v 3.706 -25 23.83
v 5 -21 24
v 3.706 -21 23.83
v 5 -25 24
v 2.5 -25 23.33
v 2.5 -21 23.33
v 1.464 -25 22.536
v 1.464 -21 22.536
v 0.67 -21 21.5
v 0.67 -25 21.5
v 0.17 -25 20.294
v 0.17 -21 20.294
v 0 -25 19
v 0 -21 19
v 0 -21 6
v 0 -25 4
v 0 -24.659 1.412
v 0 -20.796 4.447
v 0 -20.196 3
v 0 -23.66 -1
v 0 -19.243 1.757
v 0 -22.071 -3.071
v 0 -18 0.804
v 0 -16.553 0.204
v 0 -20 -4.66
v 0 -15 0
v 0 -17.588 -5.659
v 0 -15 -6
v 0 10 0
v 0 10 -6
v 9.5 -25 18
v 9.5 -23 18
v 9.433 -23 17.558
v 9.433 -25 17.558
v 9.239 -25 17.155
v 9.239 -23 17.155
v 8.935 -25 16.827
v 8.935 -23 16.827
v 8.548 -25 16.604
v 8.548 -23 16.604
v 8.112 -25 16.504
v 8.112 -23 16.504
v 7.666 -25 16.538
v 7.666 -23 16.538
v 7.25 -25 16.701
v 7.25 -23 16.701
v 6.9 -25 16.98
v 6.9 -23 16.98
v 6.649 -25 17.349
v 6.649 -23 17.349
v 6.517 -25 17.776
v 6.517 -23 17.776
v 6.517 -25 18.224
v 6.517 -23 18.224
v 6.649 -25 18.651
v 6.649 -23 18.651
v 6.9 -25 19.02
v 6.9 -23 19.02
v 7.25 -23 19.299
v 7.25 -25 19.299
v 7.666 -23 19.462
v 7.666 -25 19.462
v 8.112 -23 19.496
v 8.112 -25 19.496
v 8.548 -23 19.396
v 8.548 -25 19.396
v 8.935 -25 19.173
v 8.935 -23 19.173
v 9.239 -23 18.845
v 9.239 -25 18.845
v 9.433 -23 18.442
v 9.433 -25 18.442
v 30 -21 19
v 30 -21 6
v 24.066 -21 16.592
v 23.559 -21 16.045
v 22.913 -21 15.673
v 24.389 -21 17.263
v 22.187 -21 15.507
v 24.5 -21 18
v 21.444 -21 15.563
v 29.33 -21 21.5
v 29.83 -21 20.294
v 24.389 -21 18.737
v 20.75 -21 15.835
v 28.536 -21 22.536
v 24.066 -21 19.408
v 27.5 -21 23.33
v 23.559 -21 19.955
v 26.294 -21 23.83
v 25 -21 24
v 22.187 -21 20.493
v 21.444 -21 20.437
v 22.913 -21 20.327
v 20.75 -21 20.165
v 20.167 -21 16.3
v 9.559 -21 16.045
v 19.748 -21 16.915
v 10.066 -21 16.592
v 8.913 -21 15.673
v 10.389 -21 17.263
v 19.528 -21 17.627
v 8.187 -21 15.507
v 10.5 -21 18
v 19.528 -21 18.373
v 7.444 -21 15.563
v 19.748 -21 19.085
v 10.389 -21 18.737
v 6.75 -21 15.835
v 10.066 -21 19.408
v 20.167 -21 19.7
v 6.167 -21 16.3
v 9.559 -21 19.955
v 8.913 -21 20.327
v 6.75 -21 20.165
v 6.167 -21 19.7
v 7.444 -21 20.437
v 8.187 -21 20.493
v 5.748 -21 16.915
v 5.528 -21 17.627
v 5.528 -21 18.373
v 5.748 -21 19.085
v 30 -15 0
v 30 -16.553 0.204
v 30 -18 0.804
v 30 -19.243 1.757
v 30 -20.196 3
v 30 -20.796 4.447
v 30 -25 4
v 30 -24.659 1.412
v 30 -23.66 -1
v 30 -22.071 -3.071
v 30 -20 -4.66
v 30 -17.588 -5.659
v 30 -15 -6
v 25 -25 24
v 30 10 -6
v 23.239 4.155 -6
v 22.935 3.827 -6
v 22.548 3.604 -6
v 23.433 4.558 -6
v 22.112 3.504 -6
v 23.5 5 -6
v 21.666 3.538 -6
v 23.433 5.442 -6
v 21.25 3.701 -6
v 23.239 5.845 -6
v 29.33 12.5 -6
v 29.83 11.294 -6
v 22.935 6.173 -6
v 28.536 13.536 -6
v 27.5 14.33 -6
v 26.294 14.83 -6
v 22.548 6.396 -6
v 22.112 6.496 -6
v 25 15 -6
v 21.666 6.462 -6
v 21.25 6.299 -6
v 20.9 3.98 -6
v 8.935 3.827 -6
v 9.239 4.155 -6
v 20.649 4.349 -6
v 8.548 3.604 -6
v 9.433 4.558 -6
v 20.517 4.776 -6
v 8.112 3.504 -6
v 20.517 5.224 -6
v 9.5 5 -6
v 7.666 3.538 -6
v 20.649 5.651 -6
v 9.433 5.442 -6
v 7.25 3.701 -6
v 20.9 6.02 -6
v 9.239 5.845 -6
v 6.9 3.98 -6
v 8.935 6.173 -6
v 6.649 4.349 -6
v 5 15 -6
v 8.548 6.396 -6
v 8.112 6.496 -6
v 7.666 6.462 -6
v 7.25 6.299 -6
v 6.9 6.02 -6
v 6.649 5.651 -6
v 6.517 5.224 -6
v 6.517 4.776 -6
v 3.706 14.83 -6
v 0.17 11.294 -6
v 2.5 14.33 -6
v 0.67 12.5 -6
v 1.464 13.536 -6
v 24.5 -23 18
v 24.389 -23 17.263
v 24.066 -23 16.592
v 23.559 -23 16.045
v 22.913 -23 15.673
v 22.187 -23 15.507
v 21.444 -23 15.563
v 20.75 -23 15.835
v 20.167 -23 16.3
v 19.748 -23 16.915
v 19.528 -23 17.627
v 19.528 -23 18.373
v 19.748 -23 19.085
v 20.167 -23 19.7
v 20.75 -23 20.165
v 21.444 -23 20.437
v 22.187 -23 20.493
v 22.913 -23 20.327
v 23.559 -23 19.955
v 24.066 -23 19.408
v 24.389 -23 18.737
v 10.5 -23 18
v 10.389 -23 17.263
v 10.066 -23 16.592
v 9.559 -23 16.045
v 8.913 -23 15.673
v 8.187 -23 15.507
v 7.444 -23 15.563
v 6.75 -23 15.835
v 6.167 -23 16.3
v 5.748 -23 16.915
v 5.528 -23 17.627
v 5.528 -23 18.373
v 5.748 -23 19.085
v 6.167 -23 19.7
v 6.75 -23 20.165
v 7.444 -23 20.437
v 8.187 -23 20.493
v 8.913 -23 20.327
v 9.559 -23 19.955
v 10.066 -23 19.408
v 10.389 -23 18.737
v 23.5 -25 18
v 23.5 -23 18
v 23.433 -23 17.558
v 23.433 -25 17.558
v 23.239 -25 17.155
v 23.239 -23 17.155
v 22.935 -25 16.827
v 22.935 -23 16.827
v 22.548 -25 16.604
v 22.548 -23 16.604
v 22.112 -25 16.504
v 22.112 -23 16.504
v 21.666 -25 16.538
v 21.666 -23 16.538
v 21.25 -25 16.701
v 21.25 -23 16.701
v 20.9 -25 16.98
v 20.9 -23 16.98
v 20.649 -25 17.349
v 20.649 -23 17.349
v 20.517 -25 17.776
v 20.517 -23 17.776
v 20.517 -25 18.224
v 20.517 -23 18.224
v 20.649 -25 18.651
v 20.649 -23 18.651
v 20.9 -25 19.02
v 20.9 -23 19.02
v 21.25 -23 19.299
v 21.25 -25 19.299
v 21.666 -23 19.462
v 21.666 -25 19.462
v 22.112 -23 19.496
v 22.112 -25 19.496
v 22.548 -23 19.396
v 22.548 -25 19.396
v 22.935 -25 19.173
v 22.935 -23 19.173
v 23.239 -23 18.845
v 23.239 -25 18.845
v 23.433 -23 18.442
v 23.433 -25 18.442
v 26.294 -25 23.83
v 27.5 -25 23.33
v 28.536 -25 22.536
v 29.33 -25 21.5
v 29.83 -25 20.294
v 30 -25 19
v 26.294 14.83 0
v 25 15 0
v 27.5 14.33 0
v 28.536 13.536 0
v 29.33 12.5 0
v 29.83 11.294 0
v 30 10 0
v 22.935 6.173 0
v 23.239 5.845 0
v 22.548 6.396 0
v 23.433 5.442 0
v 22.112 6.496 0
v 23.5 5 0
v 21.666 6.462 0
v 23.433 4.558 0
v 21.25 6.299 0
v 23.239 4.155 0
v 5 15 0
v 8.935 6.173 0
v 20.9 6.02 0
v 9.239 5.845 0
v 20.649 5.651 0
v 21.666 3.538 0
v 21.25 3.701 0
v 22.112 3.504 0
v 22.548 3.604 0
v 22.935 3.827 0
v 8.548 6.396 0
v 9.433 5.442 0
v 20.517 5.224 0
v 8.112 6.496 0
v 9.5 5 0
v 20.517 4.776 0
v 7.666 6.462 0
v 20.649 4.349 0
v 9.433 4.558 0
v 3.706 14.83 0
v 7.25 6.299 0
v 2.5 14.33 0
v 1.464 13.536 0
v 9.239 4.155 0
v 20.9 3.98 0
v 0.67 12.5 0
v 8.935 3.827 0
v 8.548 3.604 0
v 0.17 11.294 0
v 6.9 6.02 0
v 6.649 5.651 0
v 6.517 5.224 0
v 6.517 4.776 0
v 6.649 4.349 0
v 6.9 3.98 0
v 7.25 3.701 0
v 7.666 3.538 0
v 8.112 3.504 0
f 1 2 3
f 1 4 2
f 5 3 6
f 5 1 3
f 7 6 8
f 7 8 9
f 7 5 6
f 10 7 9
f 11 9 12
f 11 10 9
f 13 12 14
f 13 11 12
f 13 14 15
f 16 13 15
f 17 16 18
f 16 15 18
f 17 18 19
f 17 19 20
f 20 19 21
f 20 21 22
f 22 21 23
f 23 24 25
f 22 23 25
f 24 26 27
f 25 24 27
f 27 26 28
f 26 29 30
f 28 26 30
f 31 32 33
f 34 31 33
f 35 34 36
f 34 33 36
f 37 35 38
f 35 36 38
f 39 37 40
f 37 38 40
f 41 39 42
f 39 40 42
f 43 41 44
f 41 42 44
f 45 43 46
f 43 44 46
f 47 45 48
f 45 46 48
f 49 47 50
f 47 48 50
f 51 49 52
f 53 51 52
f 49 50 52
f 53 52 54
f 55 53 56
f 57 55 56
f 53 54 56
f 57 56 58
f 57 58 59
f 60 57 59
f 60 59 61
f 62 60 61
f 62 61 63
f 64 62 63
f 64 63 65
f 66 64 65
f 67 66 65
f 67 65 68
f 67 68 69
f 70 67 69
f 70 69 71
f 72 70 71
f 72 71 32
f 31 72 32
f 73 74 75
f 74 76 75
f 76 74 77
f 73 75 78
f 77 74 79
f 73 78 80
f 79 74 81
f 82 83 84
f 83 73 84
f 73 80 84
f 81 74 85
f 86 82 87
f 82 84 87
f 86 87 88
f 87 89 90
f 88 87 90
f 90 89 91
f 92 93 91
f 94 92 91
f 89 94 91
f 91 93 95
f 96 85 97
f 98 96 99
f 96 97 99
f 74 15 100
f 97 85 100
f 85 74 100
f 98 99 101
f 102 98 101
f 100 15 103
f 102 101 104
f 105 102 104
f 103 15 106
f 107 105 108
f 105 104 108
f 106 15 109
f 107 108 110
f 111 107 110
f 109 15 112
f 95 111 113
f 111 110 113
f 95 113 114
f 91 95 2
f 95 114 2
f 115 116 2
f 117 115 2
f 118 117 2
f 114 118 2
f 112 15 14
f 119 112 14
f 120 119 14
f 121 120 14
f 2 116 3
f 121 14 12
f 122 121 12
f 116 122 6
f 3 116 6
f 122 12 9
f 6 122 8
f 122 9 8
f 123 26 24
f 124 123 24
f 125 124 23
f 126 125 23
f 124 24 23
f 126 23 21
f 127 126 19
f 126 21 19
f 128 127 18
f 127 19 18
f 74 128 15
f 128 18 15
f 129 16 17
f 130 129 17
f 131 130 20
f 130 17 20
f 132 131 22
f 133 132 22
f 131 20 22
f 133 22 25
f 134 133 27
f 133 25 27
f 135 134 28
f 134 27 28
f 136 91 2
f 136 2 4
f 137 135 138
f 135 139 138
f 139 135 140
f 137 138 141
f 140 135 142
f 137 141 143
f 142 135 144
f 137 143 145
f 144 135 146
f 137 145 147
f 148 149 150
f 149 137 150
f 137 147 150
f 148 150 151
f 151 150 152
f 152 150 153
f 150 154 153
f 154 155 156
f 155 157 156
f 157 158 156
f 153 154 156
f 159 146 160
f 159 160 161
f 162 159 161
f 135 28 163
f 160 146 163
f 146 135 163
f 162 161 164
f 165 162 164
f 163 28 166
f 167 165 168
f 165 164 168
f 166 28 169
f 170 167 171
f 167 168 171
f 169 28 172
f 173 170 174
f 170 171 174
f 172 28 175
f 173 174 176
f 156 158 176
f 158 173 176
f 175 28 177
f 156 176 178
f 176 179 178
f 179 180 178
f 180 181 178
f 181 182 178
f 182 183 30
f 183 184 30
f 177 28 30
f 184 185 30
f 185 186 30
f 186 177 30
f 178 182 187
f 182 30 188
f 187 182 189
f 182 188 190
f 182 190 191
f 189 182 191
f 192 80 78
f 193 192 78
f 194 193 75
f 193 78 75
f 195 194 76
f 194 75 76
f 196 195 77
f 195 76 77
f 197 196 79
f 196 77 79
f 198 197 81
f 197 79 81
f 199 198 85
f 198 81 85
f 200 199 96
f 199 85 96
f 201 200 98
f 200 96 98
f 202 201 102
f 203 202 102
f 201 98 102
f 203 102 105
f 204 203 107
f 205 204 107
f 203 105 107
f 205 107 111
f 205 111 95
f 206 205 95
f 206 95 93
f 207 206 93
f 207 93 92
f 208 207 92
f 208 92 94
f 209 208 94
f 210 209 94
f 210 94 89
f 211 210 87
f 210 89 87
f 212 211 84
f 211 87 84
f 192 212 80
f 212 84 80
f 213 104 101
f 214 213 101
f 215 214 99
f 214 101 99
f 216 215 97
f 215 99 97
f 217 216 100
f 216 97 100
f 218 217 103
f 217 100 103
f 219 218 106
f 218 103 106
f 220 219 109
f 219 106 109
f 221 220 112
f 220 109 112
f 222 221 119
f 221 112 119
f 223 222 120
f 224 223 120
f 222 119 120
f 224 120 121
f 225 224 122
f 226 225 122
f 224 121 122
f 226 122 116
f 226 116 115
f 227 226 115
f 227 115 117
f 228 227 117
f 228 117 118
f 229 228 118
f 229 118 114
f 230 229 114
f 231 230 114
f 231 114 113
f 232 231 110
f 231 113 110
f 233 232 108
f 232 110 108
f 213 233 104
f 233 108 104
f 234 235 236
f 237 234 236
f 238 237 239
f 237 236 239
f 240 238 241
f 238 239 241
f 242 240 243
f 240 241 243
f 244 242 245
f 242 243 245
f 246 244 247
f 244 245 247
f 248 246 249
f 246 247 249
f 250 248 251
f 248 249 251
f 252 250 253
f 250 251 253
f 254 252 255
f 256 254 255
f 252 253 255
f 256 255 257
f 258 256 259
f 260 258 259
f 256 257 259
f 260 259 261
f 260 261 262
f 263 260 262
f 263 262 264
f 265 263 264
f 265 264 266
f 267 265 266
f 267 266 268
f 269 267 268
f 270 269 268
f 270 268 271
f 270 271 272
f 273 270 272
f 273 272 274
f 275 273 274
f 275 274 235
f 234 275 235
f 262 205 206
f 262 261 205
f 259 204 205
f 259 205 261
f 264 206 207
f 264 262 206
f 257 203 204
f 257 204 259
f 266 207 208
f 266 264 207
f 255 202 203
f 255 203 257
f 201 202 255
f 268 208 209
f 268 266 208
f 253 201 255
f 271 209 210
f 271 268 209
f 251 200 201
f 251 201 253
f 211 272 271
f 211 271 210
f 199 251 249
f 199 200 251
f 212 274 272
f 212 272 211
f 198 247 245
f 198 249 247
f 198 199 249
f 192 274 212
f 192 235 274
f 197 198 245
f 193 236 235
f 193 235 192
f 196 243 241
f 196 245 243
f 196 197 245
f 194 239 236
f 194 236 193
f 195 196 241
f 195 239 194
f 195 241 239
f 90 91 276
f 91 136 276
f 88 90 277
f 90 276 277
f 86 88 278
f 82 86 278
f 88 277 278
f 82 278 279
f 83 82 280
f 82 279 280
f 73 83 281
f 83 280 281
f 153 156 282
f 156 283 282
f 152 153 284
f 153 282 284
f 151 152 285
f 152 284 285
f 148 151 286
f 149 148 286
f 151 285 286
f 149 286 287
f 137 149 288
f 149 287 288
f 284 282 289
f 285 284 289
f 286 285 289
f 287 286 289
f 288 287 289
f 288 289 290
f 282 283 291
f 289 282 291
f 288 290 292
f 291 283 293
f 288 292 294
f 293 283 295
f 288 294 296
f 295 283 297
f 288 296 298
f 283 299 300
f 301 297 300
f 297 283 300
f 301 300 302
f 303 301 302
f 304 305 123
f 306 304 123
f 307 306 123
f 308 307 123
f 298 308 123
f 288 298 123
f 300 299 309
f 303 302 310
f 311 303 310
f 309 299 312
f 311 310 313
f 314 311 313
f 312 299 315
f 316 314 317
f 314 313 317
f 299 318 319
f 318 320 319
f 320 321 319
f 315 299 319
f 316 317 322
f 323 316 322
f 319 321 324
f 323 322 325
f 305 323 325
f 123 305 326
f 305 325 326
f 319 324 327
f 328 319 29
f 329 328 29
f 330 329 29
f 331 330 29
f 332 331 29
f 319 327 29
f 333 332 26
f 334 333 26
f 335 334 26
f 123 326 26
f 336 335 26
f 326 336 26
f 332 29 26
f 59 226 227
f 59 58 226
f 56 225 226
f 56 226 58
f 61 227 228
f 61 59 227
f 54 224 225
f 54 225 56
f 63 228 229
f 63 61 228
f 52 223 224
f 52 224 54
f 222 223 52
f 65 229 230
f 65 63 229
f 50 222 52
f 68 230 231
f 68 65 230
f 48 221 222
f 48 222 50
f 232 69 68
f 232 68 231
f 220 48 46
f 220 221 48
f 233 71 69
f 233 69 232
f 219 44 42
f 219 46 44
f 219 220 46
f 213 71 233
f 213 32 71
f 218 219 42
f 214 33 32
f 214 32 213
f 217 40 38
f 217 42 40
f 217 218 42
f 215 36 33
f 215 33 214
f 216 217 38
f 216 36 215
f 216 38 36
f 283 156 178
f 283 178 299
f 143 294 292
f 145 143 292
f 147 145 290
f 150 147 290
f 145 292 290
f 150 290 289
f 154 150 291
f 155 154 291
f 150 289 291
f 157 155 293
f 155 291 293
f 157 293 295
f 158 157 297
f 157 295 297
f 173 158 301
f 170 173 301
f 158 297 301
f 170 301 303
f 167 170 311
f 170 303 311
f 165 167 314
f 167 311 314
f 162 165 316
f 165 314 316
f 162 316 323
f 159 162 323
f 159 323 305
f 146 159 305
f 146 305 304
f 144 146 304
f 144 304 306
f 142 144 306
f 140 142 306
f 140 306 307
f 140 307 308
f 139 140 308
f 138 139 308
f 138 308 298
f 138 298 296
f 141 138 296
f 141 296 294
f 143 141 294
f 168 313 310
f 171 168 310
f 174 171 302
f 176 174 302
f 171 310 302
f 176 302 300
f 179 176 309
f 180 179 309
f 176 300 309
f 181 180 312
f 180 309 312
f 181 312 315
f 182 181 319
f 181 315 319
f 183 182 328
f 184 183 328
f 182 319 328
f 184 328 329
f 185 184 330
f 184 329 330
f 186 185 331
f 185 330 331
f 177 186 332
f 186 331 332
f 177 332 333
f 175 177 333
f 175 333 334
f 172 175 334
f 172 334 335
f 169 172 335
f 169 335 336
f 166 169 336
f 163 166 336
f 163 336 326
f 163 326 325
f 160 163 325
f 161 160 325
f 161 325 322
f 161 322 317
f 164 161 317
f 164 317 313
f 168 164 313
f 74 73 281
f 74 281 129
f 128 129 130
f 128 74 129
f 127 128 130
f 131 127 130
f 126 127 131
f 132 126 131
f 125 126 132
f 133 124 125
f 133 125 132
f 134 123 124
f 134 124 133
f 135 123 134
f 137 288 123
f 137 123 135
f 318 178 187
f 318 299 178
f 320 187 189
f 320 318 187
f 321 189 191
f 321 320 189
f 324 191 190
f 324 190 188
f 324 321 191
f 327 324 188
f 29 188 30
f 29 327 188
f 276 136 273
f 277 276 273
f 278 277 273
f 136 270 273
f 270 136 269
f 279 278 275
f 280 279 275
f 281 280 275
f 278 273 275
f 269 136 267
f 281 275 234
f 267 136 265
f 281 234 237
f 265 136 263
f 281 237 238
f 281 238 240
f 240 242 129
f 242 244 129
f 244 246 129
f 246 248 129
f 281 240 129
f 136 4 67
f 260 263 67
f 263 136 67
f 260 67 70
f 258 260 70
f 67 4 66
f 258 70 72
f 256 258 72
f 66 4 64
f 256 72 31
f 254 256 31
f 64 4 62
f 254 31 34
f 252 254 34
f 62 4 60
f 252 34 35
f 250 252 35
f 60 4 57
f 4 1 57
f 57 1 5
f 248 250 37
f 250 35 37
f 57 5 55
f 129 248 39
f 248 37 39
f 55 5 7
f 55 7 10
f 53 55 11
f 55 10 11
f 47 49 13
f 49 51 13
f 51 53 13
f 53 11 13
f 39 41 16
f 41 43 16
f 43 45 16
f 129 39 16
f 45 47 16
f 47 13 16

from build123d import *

# Parameters (mm, degrees)
BOSS_EXTRUDE2_DEPTH = 30
FILLET1_R           = 5
CUT_EXTRUDE1_REACH  = 54.65
SKETCH6_R           = 1.5
SKETCH6_3_R         = 2.5
CUT_EXTRUDE2_DEPTH  = 2
CUT_EXTRUDE3_REACH  = 47.837
SKETCH8_R           = 1.5


with BuildPart() as part:
    # Sketch3 → Boss-Extrude2 (new body)
    with BuildSketch(Plane(origin=(0, 0, 0), x_dir=(0, 0, -1), z_dir=(1, 0, 0))):
        with BuildLine():
            Line((0, 15), (0, -15))
            ThreePointArc((0, -15), (-1.757359313, -19.242640687), (-6, -21))
            Line((-6, -21), (-24, -21))
            Line((-24, -21), (-24, -25))
            Line((-24, -25), (-4, -25))
            ThreePointArc((-4, -25), (3.071067812, -22.071067812), (6, -15))
            Line((6, -15), (6, 15))
            Line((6, 15), (0, 15))
        make_face()
    extrude(amount=BOSS_EXTRUDE2_DEPTH)

    # Fillet1
    fillet1_edges = [part.edges().sort_by_distance(p)[0] for p in [
        (30, 15, -3),
        (0, 15, -3),
        (30, -23, 24),
        (0, -23, 24),
    ]]
    fillet(fillet1_edges, radius=FILLET1_R)

    # Sketch6 → Cut-Extrude1 (cut, up to next)
    with BuildSketch(Plane(origin=(0, -21, 0), x_dir=(1, 0, 0), z_dir=(0, 1, 0)), mode=Mode.PRIVATE) as cut_extrude1_sk1:
        with Locations((8, -18)):
            Circle(SKETCH6_R)
    cut_extrude1_tool1 = extrude(cut_extrude1_sk1.sketch, amount=-CUT_EXTRUDE1_REACH, mode=Mode.PRIVATE) & part.part
    # Sketch6 → Cut-Extrude1 (cut, up to next)
    with BuildSketch(Plane(origin=(0, -21, 0), x_dir=(1, 0, 0), z_dir=(0, 1, 0)), mode=Mode.PRIVATE) as cut_extrude1_sk2:
        with Locations((22, -18)):
            Circle(SKETCH6_R)
    cut_extrude1_tool2 = extrude(cut_extrude1_sk2.sketch, amount=-CUT_EXTRUDE1_REACH, mode=Mode.PRIVATE) & part.part
    add(cut_extrude1_tool1.solids().sort_by_distance((8, -21, 18))[0], mode=Mode.SUBTRACT)
    add(cut_extrude1_tool2.solids().sort_by_distance((22, -21, 18))[0], mode=Mode.SUBTRACT)

    # Sketch6_3 → Cut-Extrude2 (cut)
    with BuildSketch(Plane(origin=(0, -21, 0), x_dir=(1, 0, 0), z_dir=(0, 1, 0))):
        with Locations((8, -18)):
            Circle(SKETCH6_3_R)
        with Locations((22, -18)):
            Circle(SKETCH6_3_R)
    extrude(amount=-CUT_EXTRUDE2_DEPTH, mode=Mode.SUBTRACT)

    # Sketch8 → Cut-Extrude3 (cut, up to next)
    with BuildSketch(Plane.XY, mode=Mode.PRIVATE) as cut_extrude3_sk1:
        with Locations((8, 5)):
            Circle(SKETCH8_R)
    cut_extrude3_tool1 = extrude(cut_extrude3_sk1.sketch, amount=-CUT_EXTRUDE3_REACH, mode=Mode.PRIVATE) & part.part
    # Sketch8 → Cut-Extrude3 (cut, up to next)
    with BuildSketch(Plane.XY, mode=Mode.PRIVATE) as cut_extrude3_sk2:
        with Locations((22, 5)):
            Circle(SKETCH8_R)
    cut_extrude3_tool2 = extrude(cut_extrude3_sk2.sketch, amount=-CUT_EXTRUDE3_REACH, mode=Mode.PRIVATE) & part.part
    add(cut_extrude3_tool1.solids().sort_by_distance((8, 5, 0))[0], mode=Mode.SUBTRACT)
    add(cut_extrude3_tool2.solids().sort_by_distance((22, 5, 0))[0], mode=Mode.SUBTRACT)


solid = part.part
